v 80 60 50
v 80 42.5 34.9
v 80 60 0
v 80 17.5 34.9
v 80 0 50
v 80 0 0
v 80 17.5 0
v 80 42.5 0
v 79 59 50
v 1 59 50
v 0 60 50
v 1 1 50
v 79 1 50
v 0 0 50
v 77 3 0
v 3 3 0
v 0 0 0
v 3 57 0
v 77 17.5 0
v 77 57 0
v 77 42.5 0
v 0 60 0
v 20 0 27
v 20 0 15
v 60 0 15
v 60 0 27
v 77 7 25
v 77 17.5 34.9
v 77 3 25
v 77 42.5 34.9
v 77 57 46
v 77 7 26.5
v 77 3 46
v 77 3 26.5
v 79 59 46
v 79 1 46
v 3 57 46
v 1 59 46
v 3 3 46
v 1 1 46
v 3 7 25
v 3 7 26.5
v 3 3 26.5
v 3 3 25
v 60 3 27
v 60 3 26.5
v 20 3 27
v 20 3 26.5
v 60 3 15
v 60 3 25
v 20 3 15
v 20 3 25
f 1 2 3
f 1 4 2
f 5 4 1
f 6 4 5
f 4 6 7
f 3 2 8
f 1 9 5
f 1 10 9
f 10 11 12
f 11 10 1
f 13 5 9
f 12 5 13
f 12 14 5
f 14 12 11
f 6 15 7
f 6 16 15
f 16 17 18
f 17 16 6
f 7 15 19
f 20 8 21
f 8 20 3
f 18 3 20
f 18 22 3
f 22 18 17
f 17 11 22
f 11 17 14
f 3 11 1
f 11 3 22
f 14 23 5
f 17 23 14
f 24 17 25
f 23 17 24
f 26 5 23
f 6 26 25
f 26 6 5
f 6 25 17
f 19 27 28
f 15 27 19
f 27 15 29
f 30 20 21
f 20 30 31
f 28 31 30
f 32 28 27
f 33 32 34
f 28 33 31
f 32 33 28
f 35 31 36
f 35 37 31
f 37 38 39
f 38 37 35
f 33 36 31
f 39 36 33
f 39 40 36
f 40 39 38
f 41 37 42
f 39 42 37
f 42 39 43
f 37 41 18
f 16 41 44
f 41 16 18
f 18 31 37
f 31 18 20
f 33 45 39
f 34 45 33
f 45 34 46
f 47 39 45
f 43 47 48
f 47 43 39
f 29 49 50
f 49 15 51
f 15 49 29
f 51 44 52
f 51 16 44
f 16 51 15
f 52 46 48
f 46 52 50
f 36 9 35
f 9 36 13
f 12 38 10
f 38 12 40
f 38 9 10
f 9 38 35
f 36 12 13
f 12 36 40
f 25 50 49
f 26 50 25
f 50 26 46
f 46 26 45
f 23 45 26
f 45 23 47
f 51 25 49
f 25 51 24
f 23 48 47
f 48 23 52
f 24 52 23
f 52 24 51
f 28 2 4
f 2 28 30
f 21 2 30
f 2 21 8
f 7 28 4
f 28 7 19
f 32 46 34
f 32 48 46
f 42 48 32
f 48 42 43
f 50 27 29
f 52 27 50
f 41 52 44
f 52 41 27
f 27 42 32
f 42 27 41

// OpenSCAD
// Parameters
outer_width = 80;
outer_depth = 60;
outer_height = 50;
wall_thickness = 3;
rim_height = 4;
rim_thickness = 2;

// Horizontal recess parameters
recess_width = 40;
recess_height = 12;
recess_offset_from_bottom = 15;

// Vertical opening parameters
vertical_opening_width = 25;
vertical_opening_height = 35;

// Internal ledge parameters
ledge_thickness = 1.5;
ledge_depth = 4;
ledge_height = 25;

// Resolution
$fn = 100;

// Main enclosure body
module enclosure_body() {
    difference() {
        // Outer shell
        cube([outer_width, outer_depth, outer_height]);
        
        // Hollow interior
        translate([wall_thickness, wall_thickness, 0])
            cube([outer_width - 2*wall_thickness, 
                  outer_depth - 2*wall_thickness, 
                  outer_height - rim_height]);
        
        // Rim recess (creates thicker top edge)
        translate([wall_thickness - rim_thickness, wall_thickness - rim_thickness, outer_height - rim_height])
            cube([outer_width - 2*wall_thickness + 2*rim_thickness, 
                  outer_depth - 2*wall_thickness + 2*rim_thickness, 
                  rim_height]);
    }
}

// Horizontal recess on front face
module horizontal_recess() {
    translate([(outer_width - recess_width)/2, -0.1, recess_offset_from_bottom])
        cube([recess_width, wall_thickness + 0.2, recess_height]);
}

// Vertical through opening on right face
module vertical_opening() {
    translate([outer_width - wall_thickness - 0.1, 
               (outer_depth - vertical_opening_width)/2, 
               -0.1])
        cube([wall_thickness + 0.2, vertical_opening_width, vertical_opening_height]);
}

// Internal ledge/rib
module internal_ledge() {
    translate([wall_thickness, wall_thickness, ledge_height])
        cube([outer_width - 2*wall_thickness, ledge_depth, ledge_thickness]);
}

// Final assembly
difference() {
    union() {
        enclosure_body();
    }
    
    // Subtract features
    horizontal_recess();
    vertical_opening();
}

// Add internal ledge
internal_ledge();
